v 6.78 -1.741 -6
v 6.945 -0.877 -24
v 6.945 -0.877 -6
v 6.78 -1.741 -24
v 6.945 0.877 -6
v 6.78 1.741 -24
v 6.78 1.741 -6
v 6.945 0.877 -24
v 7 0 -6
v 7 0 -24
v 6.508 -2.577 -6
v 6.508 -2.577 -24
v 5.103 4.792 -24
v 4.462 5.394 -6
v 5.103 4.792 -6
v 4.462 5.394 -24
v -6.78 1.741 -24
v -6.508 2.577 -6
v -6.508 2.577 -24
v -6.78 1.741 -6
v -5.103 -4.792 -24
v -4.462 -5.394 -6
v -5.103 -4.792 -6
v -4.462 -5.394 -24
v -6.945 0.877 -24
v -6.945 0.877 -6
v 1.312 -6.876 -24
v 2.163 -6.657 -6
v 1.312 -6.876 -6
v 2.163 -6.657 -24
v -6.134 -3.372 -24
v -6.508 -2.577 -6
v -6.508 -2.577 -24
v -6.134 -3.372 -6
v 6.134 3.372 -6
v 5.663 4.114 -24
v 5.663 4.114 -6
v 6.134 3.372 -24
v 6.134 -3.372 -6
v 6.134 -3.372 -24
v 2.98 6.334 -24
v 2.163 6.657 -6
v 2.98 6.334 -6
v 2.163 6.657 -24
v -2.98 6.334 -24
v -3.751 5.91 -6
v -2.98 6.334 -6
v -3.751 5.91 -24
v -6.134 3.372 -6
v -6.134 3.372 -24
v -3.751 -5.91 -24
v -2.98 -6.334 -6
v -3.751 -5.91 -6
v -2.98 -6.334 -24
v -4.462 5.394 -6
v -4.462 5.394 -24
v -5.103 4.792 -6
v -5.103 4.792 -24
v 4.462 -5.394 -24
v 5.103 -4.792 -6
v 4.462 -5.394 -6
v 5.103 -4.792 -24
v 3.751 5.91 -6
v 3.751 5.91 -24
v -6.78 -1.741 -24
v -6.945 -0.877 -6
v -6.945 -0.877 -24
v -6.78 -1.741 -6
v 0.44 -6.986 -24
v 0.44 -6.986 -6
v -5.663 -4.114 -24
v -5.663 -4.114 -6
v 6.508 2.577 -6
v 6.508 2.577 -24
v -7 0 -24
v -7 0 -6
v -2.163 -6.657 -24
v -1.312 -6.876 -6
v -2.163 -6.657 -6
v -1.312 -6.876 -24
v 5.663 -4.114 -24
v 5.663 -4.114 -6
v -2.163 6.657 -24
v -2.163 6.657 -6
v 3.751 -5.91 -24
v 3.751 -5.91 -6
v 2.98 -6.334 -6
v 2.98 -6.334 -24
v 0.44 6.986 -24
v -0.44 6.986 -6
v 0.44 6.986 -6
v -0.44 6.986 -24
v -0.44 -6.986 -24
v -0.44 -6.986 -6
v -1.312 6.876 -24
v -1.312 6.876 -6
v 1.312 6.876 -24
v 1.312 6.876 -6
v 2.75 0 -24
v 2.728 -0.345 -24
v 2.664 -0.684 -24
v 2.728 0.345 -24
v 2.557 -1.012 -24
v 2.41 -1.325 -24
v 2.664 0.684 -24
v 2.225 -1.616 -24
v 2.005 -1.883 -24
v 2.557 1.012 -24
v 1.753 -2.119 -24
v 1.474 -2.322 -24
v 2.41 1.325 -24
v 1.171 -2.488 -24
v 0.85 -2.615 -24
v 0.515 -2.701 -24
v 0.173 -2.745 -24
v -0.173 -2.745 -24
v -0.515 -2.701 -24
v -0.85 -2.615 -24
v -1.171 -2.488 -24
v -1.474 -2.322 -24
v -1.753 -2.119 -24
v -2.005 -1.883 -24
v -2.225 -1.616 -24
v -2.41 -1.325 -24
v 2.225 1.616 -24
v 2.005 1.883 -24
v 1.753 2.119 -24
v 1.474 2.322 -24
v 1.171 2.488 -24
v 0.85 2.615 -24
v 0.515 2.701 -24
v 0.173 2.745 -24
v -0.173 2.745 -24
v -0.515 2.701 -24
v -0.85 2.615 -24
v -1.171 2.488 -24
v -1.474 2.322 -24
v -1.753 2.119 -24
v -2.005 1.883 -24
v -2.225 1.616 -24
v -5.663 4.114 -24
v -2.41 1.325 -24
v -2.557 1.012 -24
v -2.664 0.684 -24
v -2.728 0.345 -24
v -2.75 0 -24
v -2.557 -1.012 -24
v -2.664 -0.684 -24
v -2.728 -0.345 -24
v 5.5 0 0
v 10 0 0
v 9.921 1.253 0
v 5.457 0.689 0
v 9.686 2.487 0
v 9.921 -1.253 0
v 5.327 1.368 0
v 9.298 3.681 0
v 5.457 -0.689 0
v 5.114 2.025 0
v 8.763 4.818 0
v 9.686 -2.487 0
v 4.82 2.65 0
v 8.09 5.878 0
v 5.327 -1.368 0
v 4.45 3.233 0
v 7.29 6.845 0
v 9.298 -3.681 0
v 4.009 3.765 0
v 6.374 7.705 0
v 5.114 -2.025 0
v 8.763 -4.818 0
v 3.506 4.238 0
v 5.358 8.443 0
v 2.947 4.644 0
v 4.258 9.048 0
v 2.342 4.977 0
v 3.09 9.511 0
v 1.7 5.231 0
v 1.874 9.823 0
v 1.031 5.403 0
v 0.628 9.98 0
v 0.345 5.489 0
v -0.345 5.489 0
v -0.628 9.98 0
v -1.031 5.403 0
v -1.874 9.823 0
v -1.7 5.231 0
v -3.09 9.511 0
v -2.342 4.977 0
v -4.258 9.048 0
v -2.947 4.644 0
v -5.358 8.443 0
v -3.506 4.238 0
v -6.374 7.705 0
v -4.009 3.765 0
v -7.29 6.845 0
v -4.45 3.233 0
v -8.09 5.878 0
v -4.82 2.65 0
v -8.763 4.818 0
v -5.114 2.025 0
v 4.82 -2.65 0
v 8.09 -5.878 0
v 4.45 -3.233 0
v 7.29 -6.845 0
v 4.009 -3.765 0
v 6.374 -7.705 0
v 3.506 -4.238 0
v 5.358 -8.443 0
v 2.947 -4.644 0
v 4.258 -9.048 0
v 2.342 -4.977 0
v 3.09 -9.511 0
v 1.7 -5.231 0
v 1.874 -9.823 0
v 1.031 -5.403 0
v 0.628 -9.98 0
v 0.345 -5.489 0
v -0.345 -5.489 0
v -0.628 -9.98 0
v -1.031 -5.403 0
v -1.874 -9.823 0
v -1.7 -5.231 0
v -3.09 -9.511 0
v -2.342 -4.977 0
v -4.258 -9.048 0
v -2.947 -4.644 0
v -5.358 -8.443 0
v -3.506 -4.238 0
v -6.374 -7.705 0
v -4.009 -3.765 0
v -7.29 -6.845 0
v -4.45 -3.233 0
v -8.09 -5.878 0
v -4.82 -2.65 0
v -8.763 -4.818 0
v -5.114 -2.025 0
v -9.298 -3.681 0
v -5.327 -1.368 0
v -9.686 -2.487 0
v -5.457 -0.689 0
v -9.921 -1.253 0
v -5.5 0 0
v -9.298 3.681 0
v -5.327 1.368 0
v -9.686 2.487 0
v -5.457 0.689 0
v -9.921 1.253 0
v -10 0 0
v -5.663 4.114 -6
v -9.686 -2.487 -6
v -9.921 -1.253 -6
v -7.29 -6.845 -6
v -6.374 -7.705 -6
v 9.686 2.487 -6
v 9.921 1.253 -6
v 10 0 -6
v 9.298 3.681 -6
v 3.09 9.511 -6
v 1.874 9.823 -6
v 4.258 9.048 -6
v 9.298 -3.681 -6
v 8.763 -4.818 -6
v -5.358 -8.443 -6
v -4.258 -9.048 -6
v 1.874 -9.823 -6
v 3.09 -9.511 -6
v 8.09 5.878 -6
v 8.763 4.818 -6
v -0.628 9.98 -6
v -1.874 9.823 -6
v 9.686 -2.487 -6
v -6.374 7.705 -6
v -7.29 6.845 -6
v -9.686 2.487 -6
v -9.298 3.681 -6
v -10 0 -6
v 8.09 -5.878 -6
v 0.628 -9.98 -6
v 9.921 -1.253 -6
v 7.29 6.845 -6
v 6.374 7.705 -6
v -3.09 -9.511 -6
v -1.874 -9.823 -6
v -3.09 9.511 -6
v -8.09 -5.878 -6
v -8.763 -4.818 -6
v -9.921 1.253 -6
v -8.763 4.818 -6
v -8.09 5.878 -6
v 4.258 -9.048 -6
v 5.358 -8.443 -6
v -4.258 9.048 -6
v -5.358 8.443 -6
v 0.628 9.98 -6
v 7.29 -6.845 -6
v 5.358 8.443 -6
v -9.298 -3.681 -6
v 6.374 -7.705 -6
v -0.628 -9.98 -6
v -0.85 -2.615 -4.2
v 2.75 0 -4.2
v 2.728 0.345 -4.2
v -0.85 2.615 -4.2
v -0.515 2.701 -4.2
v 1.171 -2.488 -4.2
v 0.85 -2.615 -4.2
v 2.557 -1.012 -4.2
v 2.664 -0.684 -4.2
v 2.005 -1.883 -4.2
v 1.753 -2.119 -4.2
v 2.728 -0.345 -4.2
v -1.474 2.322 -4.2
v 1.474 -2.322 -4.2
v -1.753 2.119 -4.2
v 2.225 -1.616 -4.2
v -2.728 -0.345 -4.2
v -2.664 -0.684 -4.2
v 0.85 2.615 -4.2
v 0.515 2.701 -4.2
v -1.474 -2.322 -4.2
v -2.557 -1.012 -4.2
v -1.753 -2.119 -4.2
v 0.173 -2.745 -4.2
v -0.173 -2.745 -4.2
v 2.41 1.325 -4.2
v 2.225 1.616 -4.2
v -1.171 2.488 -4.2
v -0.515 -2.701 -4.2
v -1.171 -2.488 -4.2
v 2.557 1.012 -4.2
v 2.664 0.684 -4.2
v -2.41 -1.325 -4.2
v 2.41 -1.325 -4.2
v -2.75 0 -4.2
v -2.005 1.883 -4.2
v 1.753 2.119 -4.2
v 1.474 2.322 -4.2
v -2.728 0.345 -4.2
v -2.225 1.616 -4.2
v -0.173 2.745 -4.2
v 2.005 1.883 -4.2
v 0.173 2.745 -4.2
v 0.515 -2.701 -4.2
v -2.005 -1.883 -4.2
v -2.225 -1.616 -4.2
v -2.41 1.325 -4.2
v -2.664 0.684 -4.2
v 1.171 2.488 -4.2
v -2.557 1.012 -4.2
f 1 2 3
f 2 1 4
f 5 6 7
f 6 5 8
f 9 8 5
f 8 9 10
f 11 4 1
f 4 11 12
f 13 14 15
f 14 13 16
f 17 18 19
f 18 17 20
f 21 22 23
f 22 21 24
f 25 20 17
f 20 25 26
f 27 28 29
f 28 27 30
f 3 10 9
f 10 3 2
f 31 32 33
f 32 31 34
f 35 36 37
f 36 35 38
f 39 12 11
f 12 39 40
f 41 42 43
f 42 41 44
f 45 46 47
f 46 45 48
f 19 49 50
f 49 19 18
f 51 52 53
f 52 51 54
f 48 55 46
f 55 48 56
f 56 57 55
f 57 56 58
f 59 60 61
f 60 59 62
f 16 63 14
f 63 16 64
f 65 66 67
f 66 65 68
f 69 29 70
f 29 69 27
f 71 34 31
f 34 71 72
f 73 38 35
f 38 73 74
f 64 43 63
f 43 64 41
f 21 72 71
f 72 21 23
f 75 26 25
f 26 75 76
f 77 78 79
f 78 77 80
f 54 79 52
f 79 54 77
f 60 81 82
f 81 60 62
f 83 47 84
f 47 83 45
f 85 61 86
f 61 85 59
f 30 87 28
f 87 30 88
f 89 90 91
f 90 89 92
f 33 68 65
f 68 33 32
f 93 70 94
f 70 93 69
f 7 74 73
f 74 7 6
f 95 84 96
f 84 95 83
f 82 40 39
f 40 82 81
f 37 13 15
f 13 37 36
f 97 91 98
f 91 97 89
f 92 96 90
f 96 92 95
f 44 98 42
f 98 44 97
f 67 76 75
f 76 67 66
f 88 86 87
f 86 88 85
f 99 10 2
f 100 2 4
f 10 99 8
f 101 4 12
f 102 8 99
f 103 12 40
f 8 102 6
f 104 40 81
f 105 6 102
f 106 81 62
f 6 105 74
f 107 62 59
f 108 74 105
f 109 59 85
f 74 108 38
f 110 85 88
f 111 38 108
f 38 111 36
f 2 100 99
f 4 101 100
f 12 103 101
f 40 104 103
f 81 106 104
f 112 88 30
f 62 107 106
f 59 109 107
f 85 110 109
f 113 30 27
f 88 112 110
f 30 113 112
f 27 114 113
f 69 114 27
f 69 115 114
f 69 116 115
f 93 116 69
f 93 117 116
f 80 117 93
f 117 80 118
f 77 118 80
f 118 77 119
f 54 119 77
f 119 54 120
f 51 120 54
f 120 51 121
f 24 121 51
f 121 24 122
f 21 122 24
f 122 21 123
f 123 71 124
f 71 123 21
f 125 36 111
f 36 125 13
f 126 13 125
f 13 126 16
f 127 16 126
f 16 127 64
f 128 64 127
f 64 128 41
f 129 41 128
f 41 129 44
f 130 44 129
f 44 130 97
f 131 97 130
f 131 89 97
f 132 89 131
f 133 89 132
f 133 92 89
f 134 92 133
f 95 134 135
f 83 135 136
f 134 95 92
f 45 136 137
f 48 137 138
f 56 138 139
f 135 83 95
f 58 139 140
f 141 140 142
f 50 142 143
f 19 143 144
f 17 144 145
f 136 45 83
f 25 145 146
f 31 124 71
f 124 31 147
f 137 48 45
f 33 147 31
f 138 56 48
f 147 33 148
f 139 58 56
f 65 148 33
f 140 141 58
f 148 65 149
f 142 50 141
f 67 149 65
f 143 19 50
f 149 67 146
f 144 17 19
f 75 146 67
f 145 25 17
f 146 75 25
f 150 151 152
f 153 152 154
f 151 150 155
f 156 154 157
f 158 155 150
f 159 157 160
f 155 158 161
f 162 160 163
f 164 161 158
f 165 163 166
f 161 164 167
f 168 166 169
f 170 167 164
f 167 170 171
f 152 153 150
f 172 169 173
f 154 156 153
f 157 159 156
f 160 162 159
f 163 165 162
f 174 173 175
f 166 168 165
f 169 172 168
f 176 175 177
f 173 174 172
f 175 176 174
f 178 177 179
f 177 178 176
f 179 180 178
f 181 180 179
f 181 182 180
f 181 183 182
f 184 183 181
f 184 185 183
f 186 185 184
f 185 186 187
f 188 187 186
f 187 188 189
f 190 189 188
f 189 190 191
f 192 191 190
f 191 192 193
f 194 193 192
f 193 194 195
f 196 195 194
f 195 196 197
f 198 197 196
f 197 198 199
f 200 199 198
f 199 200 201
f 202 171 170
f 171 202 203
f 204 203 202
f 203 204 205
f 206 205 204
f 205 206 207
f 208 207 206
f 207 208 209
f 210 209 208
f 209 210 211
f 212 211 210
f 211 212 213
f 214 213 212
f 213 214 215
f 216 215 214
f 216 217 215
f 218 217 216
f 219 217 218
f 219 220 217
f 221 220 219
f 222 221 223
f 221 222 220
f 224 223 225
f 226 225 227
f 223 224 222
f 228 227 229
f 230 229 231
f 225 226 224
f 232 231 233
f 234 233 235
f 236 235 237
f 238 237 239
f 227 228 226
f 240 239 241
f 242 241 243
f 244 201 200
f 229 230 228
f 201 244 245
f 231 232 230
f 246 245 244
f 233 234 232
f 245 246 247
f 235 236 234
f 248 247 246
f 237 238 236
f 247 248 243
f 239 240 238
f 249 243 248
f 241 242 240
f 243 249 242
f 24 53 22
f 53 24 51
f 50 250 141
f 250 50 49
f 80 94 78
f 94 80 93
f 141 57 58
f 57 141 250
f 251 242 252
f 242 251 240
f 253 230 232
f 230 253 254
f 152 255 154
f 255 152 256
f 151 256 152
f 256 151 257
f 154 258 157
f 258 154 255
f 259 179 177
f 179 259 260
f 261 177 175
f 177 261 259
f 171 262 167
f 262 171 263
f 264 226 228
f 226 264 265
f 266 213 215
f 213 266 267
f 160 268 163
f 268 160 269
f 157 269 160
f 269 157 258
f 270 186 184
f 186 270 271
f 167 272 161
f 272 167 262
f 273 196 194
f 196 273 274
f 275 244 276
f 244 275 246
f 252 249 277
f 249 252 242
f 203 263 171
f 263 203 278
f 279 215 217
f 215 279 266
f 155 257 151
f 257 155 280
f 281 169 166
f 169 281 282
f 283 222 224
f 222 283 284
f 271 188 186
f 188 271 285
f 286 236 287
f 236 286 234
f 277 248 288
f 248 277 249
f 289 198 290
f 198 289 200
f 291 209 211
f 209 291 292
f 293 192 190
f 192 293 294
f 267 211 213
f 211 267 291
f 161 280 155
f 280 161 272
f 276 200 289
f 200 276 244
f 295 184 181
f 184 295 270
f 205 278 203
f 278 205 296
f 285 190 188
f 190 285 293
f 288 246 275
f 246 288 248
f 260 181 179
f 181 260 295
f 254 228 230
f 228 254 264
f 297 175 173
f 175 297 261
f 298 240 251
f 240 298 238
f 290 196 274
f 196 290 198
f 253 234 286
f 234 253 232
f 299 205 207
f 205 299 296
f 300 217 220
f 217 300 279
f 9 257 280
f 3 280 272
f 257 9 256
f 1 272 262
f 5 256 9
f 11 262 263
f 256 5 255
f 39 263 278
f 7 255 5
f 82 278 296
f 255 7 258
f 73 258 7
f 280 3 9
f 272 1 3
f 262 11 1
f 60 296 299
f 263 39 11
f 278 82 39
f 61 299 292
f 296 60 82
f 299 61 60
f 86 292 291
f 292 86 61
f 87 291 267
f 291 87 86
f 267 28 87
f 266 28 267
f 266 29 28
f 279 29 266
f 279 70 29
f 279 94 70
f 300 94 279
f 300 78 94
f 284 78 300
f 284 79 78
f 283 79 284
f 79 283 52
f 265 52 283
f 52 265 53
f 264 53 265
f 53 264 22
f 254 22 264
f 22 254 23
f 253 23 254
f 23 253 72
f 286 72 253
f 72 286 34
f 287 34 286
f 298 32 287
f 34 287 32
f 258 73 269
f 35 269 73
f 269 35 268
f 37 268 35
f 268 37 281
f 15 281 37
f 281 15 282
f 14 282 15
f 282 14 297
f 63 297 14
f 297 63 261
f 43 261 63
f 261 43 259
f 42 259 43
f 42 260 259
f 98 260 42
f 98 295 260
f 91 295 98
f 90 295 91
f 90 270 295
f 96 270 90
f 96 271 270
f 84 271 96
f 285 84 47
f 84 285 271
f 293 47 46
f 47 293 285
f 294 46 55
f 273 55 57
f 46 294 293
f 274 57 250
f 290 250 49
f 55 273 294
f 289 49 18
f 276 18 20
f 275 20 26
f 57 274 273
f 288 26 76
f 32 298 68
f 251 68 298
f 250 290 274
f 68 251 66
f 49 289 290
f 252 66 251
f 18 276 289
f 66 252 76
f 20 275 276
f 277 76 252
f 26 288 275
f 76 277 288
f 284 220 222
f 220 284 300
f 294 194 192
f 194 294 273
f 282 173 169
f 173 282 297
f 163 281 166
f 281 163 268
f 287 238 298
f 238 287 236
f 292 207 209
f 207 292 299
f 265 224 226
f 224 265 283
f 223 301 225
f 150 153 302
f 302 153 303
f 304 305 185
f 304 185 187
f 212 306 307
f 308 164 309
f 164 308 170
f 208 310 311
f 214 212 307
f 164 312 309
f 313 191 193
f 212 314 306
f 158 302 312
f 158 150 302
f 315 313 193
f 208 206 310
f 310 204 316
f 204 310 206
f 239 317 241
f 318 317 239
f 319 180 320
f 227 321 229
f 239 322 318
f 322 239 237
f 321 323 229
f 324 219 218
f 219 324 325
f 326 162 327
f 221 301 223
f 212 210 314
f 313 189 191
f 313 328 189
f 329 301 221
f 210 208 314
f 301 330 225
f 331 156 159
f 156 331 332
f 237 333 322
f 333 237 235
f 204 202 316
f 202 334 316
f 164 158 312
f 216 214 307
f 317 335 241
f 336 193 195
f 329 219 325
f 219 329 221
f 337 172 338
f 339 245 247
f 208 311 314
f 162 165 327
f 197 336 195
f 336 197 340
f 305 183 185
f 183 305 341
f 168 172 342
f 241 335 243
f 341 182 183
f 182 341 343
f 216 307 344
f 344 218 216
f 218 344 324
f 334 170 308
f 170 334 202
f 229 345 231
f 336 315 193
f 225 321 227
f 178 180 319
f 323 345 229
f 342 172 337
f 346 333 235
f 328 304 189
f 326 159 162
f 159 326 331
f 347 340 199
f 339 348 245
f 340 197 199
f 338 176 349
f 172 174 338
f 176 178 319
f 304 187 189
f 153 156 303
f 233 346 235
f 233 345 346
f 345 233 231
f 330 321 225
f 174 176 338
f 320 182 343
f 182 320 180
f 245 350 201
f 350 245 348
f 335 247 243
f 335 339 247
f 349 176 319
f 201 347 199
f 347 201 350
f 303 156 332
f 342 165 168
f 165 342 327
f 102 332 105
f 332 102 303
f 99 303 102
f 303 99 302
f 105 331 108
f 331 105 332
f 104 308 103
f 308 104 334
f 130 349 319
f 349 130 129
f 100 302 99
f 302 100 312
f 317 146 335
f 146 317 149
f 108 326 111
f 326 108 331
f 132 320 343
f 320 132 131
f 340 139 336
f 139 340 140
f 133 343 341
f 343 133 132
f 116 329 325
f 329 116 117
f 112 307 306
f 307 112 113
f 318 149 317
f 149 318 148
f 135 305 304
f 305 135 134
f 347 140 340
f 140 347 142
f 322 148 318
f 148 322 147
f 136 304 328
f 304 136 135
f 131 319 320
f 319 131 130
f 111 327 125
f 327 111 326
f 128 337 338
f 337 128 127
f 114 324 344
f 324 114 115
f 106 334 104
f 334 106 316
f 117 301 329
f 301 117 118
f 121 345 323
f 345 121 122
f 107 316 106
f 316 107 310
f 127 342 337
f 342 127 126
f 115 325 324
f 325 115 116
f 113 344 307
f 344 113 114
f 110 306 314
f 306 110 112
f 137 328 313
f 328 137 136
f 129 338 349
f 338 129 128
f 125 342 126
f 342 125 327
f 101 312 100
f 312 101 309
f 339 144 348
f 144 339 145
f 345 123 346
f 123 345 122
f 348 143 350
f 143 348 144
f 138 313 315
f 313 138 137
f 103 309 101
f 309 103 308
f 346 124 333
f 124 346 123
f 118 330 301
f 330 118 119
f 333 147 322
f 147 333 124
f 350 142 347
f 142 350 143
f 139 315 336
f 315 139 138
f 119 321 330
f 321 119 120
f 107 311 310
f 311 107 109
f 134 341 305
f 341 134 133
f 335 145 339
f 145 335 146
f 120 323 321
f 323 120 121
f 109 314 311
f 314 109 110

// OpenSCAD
$fn = 50;


difference() {
	union() {
		translate(v = [0, 0, -24.0000000000]) {
			cylinder(h = 24, r = 7.0000000000);
		}
		translate(v = [0, 0, -6.0000000000]) {
			cylinder(h = 6, r = 10.0000000000);
		}
	}
	union() {
		translate(v = [0, 0, 0]) {
			rotate(a = [0, 0, 0]) {
				difference() {
					union() {
						#translate(v = [0, 0, -24.0000000000]) {
							cylinder(h = 24, r = 2.2500000000);
						}
						#translate(v = [0, 0, -4.2000000000]) {
							cylinder(h = 4.2000000000, r = 7.0000000000, r1 = 2.7500000000, r2 = 5.5000000000);
						}
						#translate(v = [0, 0, -24.0000000000]) {
							cylinder(h = 24, r = 2.7500000000);
						}
						#translate(v = [0, 0, -24.0000000000]) {
							cylinder(h = 24, r = 2.2500000000);
						}
					}
					union();
				}
			}
		}
	}
}
